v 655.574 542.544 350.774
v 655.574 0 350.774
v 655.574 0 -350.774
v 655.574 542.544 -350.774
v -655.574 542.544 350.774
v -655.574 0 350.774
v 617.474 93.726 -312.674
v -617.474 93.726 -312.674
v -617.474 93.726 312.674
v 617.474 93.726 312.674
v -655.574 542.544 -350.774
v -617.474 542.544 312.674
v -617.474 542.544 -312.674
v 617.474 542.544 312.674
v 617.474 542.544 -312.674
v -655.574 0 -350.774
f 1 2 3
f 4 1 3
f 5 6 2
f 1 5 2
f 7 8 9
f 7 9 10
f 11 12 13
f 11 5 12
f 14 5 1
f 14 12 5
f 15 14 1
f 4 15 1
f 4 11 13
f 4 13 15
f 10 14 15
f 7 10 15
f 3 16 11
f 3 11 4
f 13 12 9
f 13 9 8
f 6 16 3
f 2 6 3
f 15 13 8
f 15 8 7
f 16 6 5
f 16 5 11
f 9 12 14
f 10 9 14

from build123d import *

# Parameters (mm, degrees)
SKETCH1_W           = 1311.148
SKETCH1_H           = 701.548
BOSS_EXTRUDE1_DEPTH = 542.544
CUT_EXTRUDE1_START  = 542.544
SKETCH1_4_W         = 1234.948
SKETCH1_4_H         = 625.348
CUT_EXTRUDE1_DEPTH  = 448.818


with BuildPart() as part:
    # Sketch1 → Boss-Extrude1 (new body)
    with BuildSketch(Plane(origin=(0, 0, 0), x_dir=(1, 0, 0), z_dir=(0, 1, 0))):
        Rectangle(SKETCH1_W, SKETCH1_H)
    extrude(amount=BOSS_EXTRUDE1_DEPTH)

    # Sketch1<4> → Cut-Extrude1 (cut)
    with BuildSketch(Plane(origin=(0, 0, 0), x_dir=(1, 0, 0), z_dir=(0, 1, 0)).offset(CUT_EXTRUDE1_START)):
        Rectangle(SKETCH1_4_W, SKETCH1_4_H)
    extrude(amount=-CUT_EXTRUDE1_DEPTH, mode=Mode.SUBTRACT)


solid = part.part
